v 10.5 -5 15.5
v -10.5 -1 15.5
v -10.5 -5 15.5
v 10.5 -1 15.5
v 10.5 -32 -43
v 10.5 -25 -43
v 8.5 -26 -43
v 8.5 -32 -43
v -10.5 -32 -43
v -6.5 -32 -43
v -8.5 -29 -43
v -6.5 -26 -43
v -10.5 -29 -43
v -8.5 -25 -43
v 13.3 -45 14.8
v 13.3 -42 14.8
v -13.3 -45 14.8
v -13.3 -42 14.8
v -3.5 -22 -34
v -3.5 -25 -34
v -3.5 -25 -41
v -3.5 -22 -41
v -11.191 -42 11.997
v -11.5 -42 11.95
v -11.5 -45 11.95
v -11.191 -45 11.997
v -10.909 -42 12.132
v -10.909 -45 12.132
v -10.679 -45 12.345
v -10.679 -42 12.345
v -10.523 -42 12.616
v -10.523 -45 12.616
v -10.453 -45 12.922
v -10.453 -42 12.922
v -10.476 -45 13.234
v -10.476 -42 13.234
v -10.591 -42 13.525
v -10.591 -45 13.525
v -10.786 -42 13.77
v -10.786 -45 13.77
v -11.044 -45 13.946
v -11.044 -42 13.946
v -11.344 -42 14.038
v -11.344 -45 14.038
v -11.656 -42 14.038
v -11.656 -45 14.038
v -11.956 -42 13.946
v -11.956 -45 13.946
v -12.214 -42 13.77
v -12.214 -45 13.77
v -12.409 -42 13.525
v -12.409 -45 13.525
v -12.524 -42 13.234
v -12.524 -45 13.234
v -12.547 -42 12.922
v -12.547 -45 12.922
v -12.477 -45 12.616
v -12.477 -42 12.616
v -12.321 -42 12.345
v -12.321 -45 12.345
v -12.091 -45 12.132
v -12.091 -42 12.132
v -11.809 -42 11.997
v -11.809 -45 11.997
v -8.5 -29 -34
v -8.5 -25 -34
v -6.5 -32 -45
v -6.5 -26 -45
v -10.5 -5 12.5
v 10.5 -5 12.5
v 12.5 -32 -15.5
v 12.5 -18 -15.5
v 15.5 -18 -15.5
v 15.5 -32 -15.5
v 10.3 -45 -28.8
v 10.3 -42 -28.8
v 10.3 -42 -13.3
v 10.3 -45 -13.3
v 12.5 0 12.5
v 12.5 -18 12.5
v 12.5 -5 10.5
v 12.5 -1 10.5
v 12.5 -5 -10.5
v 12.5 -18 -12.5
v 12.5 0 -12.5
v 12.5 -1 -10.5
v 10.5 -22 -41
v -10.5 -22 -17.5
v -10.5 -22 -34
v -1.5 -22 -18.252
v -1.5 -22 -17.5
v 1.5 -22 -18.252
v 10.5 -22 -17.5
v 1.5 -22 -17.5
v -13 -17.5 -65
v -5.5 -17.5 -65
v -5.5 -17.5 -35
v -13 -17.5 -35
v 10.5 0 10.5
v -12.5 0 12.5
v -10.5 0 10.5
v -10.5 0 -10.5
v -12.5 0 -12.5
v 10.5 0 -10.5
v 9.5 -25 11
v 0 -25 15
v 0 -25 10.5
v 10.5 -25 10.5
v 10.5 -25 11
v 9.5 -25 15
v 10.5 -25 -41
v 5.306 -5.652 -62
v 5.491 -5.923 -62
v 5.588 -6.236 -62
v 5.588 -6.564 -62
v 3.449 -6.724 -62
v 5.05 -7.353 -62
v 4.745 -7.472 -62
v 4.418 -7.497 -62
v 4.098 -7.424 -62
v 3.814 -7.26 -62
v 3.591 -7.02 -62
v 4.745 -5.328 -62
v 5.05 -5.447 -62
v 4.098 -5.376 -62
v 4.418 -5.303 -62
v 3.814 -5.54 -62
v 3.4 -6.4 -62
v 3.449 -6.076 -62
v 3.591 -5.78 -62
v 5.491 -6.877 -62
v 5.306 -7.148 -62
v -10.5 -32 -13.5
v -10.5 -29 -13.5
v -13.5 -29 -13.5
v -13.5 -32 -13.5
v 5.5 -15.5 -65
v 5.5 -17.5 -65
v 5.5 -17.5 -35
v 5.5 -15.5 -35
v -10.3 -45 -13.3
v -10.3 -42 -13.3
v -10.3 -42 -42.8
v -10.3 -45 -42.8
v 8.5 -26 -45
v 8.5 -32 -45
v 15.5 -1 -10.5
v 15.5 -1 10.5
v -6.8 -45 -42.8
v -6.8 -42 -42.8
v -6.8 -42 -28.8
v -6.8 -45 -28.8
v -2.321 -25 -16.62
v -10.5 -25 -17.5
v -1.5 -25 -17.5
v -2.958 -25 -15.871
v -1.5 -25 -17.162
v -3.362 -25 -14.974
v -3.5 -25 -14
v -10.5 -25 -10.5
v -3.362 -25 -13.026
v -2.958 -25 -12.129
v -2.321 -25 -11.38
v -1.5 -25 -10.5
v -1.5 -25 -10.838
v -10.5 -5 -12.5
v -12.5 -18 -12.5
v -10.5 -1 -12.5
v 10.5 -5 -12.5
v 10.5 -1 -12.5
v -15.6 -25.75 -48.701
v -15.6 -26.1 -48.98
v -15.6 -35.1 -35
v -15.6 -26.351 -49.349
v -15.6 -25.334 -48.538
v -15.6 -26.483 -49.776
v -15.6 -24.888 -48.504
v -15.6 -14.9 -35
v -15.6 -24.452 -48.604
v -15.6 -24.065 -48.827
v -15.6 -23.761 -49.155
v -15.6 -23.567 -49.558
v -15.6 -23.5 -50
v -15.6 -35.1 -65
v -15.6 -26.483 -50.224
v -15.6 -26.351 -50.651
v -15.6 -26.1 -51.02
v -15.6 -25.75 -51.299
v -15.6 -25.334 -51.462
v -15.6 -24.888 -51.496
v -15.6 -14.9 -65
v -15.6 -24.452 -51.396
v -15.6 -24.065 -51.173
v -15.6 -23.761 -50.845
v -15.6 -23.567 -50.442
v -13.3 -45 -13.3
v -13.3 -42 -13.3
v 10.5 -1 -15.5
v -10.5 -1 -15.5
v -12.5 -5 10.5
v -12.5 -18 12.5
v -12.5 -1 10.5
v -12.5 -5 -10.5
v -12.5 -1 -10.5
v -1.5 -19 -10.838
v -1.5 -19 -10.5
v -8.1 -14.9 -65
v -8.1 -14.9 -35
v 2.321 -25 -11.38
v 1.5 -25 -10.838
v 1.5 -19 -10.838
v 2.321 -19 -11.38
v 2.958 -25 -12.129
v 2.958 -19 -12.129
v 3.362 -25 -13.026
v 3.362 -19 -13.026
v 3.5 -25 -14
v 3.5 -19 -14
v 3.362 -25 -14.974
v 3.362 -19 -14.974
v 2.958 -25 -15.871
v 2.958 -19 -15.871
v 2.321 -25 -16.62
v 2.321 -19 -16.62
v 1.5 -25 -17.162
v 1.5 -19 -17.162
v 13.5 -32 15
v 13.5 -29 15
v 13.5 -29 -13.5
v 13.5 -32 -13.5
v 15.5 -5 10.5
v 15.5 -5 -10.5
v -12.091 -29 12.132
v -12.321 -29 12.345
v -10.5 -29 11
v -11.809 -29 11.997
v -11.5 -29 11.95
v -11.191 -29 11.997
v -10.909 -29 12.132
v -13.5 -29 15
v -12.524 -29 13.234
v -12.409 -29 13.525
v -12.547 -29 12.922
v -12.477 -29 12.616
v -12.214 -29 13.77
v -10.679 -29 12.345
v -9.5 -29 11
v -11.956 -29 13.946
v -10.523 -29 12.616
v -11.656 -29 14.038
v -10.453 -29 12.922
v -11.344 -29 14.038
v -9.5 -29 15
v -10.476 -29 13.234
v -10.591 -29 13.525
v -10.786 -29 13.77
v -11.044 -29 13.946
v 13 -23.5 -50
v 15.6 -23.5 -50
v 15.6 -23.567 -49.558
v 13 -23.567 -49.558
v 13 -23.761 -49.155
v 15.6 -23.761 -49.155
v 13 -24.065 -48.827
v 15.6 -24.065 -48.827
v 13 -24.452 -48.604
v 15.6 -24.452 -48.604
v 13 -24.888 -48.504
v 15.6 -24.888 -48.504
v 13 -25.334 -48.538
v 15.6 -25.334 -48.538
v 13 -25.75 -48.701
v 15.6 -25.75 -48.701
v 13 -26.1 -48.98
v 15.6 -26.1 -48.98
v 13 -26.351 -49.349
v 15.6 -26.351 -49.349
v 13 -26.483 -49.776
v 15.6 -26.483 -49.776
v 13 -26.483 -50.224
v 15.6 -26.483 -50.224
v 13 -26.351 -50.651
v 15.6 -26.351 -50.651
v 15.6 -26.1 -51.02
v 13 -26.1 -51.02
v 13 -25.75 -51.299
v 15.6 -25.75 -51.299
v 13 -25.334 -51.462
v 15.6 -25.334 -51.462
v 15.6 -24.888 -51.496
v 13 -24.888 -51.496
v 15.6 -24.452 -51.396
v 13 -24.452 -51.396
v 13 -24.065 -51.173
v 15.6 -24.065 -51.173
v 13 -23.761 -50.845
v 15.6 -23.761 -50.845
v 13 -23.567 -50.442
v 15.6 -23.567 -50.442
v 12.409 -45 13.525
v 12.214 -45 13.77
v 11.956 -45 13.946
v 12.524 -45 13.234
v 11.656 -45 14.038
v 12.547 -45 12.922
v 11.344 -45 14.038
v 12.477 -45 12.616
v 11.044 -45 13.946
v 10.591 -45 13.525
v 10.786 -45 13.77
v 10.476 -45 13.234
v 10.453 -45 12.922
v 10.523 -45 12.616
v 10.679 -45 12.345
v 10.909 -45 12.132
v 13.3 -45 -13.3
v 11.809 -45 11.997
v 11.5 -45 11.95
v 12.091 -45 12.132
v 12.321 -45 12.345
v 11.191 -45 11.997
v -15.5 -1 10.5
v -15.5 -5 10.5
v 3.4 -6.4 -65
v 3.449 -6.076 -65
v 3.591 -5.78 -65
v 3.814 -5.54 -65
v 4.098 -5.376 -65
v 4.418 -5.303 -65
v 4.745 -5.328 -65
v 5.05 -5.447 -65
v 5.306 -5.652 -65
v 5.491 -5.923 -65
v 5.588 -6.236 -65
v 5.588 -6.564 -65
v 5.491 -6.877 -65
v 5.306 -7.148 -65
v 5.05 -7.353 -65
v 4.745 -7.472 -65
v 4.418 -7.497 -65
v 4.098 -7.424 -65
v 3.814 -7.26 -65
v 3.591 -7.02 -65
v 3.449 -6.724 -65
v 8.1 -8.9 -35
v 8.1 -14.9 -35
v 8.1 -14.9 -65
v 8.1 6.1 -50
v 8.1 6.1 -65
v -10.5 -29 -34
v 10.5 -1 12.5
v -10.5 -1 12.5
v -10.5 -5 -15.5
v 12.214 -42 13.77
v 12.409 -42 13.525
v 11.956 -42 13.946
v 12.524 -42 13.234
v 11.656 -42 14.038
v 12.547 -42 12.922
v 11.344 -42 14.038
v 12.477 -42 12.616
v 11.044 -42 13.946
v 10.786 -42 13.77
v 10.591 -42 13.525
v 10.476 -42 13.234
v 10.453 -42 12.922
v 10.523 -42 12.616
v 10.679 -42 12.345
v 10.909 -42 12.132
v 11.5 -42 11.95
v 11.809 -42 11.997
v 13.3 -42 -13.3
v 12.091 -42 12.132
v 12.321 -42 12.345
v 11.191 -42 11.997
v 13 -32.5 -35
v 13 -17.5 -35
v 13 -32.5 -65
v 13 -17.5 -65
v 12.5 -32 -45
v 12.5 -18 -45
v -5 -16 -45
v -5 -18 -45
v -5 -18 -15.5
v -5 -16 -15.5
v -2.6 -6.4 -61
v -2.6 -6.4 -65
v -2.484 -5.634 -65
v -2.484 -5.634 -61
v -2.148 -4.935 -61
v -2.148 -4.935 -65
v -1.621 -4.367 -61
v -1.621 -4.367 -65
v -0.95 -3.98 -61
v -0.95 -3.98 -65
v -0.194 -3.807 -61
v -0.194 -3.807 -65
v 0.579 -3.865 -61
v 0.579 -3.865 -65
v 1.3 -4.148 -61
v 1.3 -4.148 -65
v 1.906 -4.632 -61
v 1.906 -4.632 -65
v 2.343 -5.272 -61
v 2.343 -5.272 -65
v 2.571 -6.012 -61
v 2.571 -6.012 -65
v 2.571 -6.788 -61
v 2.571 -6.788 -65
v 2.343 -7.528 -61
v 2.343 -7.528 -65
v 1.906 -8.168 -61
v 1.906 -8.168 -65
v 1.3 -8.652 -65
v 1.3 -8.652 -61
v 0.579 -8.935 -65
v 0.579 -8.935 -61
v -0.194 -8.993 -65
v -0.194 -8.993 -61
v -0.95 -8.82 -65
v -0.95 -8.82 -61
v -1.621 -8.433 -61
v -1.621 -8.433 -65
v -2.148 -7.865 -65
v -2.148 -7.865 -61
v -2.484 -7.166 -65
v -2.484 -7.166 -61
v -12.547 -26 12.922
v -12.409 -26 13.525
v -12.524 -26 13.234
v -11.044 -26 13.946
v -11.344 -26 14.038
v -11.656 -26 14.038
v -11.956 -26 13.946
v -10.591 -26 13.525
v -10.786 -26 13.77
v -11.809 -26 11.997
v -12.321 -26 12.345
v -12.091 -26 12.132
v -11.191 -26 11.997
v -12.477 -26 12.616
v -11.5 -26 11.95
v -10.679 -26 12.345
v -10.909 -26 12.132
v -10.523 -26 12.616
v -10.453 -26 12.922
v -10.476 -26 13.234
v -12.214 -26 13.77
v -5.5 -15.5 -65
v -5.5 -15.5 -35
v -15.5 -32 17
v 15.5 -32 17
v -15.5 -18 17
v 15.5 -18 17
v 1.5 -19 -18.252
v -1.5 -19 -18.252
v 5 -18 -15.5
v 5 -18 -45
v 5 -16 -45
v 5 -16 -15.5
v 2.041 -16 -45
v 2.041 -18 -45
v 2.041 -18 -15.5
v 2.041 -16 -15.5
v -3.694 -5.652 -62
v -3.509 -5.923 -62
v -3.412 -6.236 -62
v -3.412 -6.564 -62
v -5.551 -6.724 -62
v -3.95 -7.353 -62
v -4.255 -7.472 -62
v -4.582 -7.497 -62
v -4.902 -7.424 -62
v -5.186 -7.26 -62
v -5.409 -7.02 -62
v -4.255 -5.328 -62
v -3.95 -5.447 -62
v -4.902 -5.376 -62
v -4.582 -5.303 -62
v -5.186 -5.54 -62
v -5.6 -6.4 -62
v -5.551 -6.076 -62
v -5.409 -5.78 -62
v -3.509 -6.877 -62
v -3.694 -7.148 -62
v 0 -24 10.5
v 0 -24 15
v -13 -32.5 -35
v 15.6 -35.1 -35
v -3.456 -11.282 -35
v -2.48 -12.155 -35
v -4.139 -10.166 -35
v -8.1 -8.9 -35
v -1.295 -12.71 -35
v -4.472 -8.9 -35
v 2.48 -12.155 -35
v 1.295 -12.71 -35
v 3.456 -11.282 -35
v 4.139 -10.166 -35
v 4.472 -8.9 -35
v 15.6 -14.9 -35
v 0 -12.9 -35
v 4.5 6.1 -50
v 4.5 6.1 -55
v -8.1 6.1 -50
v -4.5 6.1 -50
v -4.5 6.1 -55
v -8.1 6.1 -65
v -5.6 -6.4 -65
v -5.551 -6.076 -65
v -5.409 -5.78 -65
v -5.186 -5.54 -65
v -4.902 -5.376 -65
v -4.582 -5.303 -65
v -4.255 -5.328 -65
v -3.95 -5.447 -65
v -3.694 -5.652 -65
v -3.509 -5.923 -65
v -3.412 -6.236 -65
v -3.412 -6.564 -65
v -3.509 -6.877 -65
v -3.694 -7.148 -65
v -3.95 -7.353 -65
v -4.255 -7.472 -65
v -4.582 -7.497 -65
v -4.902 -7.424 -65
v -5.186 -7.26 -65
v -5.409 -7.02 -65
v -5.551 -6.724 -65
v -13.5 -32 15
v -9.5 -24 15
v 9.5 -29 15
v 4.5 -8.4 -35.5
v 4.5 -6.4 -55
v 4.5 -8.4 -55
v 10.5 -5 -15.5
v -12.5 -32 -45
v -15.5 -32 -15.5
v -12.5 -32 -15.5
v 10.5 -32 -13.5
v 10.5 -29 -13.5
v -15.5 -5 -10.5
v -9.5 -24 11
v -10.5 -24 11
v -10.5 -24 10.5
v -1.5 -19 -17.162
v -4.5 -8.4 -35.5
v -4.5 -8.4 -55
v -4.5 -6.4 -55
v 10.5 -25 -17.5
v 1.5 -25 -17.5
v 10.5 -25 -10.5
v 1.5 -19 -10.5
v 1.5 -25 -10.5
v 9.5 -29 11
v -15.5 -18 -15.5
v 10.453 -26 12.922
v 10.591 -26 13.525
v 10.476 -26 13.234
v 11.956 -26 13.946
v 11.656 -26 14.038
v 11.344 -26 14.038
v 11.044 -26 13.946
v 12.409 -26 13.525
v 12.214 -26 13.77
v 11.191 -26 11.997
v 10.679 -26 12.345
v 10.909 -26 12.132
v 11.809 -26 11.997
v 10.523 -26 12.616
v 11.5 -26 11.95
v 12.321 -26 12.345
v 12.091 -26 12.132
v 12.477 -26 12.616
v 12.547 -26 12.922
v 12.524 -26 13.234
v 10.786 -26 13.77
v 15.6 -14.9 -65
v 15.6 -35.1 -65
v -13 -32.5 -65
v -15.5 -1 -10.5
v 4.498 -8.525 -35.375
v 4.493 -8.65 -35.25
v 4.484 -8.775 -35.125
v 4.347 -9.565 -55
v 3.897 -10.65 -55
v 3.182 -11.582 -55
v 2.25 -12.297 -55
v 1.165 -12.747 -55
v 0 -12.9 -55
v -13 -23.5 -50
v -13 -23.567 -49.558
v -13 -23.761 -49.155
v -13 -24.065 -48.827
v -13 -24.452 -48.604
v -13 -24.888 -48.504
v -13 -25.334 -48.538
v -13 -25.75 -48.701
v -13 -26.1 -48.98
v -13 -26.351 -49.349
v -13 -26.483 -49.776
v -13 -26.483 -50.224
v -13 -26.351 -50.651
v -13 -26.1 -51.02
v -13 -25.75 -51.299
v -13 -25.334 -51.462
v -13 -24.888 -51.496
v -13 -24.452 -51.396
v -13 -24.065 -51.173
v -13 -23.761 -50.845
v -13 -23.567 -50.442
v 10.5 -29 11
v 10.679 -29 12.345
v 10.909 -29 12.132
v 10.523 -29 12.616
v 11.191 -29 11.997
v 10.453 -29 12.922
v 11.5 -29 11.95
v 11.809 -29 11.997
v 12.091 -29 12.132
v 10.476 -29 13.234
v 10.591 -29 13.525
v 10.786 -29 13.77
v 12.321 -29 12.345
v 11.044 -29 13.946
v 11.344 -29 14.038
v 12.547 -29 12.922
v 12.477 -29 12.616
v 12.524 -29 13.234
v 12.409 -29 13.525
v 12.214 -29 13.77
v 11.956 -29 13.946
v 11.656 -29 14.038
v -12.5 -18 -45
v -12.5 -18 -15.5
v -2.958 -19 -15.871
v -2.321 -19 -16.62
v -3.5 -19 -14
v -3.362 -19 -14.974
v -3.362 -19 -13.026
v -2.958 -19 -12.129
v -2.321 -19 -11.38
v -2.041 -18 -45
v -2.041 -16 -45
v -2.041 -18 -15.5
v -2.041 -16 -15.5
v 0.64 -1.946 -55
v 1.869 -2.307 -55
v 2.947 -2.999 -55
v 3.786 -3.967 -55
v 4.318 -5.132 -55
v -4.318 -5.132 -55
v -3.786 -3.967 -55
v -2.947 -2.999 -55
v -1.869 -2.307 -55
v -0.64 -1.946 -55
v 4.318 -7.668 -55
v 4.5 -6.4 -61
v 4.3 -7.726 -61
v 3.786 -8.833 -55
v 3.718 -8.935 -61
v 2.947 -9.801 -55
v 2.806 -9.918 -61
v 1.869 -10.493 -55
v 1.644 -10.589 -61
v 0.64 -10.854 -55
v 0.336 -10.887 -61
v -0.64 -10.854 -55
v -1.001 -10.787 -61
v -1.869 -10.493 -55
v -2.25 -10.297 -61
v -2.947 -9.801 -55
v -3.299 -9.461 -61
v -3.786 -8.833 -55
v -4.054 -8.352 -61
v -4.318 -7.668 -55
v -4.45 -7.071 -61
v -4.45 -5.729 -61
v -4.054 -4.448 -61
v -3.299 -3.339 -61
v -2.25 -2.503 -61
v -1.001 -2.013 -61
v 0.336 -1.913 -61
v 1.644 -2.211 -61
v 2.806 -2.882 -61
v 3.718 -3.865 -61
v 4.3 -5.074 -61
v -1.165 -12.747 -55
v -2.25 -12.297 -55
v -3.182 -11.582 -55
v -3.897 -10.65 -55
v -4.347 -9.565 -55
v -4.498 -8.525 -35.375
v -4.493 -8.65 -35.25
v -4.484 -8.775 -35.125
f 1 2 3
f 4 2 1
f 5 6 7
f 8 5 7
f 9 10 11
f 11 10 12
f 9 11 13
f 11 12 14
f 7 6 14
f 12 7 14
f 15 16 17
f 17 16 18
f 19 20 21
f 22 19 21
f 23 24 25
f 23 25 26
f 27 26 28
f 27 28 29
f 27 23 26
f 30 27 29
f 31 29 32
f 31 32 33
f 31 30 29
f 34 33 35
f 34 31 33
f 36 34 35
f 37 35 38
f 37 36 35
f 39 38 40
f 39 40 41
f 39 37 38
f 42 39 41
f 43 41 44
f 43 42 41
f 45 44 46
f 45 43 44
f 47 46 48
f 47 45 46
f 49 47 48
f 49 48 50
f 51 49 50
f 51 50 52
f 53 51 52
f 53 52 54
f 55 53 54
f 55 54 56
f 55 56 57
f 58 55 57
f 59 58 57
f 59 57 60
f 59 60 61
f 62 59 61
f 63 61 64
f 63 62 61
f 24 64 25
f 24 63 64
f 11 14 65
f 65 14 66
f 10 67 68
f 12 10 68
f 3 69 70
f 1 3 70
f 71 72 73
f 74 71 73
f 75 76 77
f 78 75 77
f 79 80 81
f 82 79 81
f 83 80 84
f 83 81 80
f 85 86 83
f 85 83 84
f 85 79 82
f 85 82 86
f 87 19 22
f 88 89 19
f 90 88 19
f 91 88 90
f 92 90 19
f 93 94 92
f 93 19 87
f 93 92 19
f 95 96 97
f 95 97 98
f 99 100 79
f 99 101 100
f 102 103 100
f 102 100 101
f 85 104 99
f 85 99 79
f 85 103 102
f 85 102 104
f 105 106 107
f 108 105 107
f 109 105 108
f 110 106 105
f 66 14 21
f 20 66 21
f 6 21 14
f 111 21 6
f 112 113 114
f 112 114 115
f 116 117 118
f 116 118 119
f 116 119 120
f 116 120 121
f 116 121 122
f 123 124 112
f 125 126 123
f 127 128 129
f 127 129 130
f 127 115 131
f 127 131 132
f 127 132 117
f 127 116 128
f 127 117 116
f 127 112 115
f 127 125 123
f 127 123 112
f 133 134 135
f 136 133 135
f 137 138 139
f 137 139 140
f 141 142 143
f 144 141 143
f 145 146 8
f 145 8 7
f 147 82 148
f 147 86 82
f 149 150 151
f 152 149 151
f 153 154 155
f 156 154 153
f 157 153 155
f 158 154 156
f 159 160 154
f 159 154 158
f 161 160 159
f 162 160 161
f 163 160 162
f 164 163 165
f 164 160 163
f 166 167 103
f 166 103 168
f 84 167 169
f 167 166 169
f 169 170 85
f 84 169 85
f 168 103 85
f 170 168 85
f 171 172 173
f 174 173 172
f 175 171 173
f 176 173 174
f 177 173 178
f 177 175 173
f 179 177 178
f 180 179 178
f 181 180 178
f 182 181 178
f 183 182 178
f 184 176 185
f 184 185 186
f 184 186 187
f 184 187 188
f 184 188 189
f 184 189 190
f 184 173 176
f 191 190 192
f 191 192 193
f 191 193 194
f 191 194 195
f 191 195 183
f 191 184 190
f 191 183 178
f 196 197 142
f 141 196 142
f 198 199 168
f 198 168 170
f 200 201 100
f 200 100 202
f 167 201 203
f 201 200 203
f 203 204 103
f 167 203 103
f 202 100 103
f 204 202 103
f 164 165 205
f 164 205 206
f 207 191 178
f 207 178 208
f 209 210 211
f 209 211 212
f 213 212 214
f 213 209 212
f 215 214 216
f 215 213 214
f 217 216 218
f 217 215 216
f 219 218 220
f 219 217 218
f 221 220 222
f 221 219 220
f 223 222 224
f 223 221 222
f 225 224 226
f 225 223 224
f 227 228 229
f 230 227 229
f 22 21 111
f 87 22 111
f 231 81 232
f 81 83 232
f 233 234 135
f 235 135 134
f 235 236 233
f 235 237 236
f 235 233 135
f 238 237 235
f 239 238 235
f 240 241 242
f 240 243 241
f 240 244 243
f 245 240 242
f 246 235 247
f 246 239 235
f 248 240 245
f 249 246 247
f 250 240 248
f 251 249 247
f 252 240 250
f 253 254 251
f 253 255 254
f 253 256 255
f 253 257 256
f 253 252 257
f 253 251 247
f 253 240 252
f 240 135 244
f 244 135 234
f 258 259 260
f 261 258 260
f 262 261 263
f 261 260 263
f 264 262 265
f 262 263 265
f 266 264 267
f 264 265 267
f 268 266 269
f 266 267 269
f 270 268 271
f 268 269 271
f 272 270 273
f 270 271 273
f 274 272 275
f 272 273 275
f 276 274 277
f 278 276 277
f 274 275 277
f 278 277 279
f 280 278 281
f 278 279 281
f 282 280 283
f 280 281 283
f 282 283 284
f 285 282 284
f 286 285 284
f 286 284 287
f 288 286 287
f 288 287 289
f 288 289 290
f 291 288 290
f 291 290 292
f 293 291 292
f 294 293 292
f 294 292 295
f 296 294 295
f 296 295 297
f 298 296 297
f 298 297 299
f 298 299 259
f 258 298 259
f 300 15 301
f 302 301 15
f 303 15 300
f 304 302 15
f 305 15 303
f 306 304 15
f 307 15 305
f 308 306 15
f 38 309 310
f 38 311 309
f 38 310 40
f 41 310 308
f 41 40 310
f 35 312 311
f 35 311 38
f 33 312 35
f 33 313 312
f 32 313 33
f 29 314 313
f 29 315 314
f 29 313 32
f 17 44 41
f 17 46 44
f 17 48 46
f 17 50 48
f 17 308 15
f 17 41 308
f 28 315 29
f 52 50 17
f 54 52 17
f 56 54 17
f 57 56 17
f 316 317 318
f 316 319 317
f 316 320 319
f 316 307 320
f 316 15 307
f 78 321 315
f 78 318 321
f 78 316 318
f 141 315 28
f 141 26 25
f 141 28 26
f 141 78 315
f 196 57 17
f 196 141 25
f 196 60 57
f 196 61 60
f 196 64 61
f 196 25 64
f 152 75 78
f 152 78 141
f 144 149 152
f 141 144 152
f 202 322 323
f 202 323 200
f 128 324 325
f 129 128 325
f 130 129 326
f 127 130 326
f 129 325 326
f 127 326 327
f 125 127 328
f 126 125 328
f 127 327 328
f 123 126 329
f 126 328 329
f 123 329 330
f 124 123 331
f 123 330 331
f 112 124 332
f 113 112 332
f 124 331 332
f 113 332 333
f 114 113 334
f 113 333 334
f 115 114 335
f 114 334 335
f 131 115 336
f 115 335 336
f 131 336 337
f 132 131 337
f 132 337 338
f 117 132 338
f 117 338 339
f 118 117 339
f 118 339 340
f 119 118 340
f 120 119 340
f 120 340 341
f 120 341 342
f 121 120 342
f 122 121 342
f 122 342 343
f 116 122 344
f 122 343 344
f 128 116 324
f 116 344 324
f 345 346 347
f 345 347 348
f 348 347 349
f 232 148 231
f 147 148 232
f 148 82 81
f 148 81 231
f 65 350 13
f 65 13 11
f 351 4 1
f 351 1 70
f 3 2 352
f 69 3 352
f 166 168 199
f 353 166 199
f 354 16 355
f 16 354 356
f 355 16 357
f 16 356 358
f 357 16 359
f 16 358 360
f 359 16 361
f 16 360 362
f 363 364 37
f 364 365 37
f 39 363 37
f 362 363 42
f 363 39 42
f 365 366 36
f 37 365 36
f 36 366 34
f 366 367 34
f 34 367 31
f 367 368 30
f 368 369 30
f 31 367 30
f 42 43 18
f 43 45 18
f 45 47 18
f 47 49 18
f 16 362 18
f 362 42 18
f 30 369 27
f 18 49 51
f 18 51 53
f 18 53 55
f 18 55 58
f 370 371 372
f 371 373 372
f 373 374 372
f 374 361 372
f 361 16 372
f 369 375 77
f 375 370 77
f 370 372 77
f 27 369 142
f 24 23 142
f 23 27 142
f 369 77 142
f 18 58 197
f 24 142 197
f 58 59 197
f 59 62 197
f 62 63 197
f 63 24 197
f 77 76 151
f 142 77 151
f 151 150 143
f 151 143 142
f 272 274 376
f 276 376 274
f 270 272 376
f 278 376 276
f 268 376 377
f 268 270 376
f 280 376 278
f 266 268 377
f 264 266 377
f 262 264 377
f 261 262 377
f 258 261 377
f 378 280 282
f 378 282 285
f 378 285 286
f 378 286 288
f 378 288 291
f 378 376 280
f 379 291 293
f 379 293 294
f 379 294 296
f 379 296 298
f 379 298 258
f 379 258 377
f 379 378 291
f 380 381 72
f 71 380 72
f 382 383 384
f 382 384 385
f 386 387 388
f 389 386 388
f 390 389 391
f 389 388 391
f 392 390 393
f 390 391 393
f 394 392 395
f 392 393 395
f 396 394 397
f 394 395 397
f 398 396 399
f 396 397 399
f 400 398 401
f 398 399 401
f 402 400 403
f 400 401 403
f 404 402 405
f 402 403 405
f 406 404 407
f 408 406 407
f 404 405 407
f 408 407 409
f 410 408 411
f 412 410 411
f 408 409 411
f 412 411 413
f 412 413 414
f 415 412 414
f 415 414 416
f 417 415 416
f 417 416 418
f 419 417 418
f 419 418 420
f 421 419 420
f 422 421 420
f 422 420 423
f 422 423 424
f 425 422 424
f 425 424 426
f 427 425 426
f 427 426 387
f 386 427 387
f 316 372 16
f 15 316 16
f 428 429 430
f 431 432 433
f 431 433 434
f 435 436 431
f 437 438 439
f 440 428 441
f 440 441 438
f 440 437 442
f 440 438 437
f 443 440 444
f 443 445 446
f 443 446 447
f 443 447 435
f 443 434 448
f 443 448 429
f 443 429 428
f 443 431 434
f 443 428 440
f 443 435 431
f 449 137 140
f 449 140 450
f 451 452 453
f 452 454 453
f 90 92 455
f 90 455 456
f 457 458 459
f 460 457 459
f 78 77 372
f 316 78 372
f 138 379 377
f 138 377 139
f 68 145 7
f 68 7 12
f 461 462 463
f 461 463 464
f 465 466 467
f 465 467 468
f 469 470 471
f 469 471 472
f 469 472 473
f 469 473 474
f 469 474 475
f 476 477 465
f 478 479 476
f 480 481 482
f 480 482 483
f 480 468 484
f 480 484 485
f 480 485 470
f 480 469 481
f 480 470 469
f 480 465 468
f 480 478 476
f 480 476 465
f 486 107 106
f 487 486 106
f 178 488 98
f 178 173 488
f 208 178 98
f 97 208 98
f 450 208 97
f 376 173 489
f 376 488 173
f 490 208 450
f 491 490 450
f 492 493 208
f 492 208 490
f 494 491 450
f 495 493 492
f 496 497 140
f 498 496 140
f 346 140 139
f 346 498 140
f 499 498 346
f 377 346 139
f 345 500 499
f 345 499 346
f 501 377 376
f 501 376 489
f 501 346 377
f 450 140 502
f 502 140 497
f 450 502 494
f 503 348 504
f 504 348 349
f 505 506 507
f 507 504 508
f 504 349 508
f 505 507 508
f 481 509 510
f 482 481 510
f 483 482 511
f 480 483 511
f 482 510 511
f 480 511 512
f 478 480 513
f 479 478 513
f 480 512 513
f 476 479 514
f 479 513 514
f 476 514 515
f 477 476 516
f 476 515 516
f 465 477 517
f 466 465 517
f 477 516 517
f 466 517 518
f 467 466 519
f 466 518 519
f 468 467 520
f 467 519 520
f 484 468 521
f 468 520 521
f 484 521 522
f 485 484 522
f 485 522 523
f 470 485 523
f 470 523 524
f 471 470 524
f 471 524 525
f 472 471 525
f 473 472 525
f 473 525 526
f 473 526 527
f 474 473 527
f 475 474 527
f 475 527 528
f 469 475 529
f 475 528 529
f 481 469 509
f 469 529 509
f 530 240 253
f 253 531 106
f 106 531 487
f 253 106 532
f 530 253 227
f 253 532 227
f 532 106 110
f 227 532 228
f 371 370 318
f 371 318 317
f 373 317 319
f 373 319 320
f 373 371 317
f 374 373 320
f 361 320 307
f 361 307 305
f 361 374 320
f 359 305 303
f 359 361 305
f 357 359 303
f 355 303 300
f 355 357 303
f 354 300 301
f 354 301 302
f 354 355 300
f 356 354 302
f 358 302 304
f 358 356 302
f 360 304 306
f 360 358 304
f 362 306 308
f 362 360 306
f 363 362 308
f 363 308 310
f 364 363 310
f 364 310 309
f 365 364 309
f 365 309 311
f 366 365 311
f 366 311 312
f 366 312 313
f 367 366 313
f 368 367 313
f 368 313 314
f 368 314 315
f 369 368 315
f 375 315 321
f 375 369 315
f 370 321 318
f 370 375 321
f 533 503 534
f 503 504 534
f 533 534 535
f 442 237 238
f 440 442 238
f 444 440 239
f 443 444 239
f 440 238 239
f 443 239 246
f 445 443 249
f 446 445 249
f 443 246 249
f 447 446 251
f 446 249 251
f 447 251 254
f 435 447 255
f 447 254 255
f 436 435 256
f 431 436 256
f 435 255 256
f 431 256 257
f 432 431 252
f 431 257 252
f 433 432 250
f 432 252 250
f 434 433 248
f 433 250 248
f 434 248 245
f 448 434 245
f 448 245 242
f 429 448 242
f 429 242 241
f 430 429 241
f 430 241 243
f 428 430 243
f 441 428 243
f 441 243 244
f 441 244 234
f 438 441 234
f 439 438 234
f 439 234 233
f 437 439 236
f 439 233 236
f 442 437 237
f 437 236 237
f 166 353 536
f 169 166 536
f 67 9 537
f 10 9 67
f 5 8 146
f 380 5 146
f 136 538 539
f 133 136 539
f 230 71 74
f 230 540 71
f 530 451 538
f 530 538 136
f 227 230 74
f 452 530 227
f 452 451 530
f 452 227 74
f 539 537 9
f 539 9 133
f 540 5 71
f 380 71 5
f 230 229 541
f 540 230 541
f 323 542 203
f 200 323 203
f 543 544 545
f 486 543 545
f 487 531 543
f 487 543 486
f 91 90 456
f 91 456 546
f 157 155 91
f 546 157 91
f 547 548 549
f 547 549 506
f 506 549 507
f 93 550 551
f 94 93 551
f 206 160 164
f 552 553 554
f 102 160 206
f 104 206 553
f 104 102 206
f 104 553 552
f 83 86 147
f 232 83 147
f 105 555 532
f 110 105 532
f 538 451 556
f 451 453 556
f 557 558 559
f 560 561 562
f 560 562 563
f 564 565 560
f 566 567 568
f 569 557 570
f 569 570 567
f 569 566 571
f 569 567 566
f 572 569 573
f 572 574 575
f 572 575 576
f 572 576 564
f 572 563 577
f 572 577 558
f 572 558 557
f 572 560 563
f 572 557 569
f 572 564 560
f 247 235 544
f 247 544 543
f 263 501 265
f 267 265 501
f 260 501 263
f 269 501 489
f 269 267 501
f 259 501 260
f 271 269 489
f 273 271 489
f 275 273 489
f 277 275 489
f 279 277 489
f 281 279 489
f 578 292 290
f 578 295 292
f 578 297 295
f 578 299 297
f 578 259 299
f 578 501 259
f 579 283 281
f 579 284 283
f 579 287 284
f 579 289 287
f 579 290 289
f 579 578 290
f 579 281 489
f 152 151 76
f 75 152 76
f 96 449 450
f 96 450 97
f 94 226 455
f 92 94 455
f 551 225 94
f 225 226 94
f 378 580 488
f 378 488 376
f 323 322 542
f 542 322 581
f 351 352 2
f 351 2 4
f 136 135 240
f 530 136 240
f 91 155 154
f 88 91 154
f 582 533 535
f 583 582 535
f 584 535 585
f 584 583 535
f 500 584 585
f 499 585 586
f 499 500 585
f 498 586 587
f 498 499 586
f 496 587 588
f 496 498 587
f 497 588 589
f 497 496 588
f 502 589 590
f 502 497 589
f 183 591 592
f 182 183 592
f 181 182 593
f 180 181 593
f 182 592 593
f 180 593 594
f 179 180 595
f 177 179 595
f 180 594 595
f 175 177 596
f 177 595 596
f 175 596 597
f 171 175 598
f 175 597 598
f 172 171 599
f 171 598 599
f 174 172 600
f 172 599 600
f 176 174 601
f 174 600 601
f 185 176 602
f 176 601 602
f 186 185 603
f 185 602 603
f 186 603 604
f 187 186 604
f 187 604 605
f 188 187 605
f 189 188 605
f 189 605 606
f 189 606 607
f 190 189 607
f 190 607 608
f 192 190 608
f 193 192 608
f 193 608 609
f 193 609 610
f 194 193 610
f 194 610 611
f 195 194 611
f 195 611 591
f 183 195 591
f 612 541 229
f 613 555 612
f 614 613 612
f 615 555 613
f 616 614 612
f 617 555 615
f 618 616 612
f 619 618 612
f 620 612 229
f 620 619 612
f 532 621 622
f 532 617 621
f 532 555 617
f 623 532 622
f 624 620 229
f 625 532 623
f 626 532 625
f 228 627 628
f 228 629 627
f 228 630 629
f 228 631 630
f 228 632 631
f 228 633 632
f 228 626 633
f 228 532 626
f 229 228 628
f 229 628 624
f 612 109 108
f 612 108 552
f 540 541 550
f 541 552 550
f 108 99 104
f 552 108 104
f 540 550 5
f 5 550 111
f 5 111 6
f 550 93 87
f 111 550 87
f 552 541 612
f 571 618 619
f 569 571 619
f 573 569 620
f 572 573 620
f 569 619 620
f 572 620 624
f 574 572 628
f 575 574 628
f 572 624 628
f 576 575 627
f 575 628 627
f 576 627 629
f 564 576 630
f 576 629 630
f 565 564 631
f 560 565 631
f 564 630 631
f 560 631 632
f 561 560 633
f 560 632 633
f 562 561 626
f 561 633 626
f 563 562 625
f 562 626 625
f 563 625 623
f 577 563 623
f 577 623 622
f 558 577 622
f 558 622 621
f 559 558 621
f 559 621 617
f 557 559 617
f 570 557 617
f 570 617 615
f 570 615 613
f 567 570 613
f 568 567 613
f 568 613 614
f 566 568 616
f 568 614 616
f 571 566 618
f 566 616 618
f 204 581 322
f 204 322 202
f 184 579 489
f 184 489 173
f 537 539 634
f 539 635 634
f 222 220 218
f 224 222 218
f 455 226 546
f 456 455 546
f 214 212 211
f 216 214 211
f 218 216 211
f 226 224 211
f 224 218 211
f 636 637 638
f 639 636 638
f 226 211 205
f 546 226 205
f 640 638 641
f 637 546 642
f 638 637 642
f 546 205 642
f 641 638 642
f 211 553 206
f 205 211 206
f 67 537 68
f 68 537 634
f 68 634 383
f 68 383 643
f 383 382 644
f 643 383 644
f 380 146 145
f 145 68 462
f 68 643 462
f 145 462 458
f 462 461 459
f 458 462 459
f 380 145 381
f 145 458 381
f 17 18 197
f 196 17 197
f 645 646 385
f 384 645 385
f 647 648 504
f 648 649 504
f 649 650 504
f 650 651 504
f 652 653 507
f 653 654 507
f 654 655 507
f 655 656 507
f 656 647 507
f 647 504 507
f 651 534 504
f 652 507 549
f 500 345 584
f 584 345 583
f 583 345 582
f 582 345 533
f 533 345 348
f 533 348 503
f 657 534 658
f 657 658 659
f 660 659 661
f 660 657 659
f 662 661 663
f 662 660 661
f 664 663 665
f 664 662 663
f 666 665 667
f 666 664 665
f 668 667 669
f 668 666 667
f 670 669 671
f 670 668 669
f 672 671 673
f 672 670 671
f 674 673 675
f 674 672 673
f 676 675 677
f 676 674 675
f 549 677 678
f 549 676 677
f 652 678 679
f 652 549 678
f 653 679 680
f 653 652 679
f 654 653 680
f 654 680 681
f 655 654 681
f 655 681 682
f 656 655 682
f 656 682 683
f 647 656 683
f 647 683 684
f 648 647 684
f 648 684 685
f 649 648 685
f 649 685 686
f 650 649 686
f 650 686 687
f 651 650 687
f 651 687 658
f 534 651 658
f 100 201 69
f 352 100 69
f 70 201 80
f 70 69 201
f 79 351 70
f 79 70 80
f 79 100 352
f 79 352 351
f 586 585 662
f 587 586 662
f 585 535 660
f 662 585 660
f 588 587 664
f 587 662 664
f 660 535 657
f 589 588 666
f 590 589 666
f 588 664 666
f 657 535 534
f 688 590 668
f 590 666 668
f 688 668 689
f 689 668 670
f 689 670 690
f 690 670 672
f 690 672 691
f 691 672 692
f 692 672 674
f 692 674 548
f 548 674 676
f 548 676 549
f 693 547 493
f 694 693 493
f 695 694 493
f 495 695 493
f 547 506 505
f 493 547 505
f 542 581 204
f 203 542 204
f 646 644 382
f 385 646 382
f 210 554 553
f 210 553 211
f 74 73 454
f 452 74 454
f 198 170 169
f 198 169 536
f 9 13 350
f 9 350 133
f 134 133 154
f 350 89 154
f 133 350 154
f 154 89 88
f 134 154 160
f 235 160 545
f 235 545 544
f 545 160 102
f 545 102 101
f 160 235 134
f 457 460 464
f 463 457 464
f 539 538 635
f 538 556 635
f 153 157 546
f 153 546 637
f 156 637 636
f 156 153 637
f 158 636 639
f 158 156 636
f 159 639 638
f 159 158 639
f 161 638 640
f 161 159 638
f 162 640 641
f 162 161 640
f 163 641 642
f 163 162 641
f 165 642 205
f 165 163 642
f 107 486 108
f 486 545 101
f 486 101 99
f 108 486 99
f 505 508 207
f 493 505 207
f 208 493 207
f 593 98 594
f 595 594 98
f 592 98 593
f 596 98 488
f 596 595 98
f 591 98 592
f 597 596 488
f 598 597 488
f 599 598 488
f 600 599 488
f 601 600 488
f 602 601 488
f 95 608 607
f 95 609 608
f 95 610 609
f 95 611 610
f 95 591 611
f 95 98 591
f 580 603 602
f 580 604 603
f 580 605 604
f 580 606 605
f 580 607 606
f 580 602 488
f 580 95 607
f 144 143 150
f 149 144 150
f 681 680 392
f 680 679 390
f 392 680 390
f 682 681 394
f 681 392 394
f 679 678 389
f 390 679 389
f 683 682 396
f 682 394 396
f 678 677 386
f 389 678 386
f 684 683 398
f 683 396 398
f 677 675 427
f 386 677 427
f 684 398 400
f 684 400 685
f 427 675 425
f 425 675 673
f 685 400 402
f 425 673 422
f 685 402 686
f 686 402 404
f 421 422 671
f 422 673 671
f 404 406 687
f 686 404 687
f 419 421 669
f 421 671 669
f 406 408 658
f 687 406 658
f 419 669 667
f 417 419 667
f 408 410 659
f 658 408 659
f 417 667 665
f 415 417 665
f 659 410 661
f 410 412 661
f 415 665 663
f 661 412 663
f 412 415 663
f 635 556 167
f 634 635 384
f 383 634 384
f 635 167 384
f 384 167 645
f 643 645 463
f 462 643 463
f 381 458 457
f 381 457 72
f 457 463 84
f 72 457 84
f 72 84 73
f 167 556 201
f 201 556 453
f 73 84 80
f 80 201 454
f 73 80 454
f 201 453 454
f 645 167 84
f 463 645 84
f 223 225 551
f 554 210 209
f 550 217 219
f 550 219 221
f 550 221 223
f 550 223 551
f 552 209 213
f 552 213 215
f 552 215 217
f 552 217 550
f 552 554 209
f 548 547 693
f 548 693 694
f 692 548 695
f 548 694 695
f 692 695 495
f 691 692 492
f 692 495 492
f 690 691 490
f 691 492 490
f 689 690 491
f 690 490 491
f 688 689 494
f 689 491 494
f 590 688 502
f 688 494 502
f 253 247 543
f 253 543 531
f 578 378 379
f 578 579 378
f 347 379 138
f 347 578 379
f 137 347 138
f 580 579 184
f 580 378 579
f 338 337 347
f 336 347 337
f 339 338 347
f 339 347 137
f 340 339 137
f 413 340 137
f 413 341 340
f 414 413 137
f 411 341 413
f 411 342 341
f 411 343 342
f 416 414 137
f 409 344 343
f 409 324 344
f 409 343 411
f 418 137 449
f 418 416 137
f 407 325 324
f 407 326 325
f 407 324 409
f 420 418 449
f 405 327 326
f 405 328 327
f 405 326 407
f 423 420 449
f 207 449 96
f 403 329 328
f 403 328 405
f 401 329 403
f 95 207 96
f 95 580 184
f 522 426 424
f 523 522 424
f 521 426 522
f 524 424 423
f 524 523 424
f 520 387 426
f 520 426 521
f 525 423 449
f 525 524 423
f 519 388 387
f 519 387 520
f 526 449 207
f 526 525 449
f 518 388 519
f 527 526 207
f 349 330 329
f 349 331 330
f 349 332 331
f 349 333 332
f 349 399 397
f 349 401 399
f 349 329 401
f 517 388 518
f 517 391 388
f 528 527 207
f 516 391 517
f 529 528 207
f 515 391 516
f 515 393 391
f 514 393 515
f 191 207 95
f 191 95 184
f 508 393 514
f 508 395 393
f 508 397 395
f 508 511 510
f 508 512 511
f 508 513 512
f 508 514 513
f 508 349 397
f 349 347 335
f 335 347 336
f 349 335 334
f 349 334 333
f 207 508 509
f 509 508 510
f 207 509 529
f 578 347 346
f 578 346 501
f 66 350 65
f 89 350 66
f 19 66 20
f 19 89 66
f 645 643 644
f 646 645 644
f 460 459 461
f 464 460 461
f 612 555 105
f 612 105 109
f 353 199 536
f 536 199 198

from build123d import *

# Parameters (mm, degrees)
SKETCH2_W            = 25
SKETCH2_H            = 25
SKETCH2_W_2          = 21
SKETCH2_H_2          = 21
BOSS_EXTRUDE1_DEPTH  = 25
BOSS_EXTRUDE2_START  = -1
SKETCH2_3_W          = 31
SKETCH2_3_H          = 31
SKETCH2_3_W_2        = 25
SKETCH2_3_H_2        = 25
BOSS_EXTRUDE2_DEPTH  = 4
SKETCH3_W            = 21
SKETCH3_H            = 21
BOSS_EXTRUDE4_DEPTH  = 7
CUT_EXTRUDE2_DEPTH   = 6
SKETCH3_12_W         = 21
SKETCH3_12_H         = 58
BOSS_EXTRUDE5_DEPTH  = 4
SKETCH3_16_W         = 10.5
SKETCH3_16_H         = 2
SKETCH3_16_H_2       = 2.5
CUT_EXTRUDE12_DEPTH  = 1
SKETCH6_W            = 1
SKETCH6_H            = 4
BOSS_EXTRUDE7_DEPTH  = 6
BOSS_EXTRUDE8_DEPTH  = 3
SKETCH7_R            = 1.05
CUT_EXTRUDE9_DEPTH   = 3
CUT_EXTRUDE11_DEPTH  = 3
SKETCH10_W           = 2
SKETCH10_H           = 9
BOSS_EXTRUDE12_DEPTH = 4
SKETCH8_R            = 1.05
BOSS_EXTRUDE9_DEPTH  = 3
SKETCH9_W            = 15
SKETCH9_H            = 6
CUT_EXTRUDE10_DEPTH  = 2
SKETCH11_W           = 3
SKETCH11_H           = 3
SKETCH11_W_2         = 2
SKETCH11_H_2         = 2
CUT_EXTRUDE13_DEPTH  = 4
SKETCH12_W           = 2.959272996
SKETCH12_H           = 2
BOSS_EXTRUDE13_DEPTH = 29.5
BOSS_EXTRUDE14_DEPTH = 30
SKETCH14_W           = 16.2
SKETCH14_H           = 19
BOSS_EXTRUDE16_DEPTH = 10
SKETCH14_5_R         = 1.1
CUT_EXTRUDE14_DEPTH  = 3
SKETCH14_7_R         = 2.6
CUT_EXTRUDE15_DEPTH  = 10
CUT_EXTRUDE16_START  = -10
SKETCH14_8_R         = 4.5
CUT_EXTRUDE16_DEPTH  = 6
BOSS_EXTRUDE18_DEPTH = 20
CHAMFER1_SIZE        = 15
FILLET1_R            = 4.5
SKETCH19_R           = 1.5
CUT_EXTRUDE17_DEPTH  = 35


with BuildPart() as part:
    # Sketch2 → Boss-Extrude1 (new body)
    with BuildSketch(Plane(origin=(0, 0, 0), x_dir=(1, 0, 0), z_dir=(0, 1, 0))):
        Rectangle(SKETCH2_W, SKETCH2_H)
        Rectangle(SKETCH2_W_2, SKETCH2_H_2, mode=Mode.SUBTRACT)
    extrude(amount=-BOSS_EXTRUDE1_DEPTH)

    # Sketch2<3> → Boss-Extrude2 (add)
    with BuildSketch(Plane(origin=(0, 0, 0), x_dir=(1, 0, 0), z_dir=(0, 1, 0)).offset(BOSS_EXTRUDE2_START)):
        Rectangle(SKETCH2_3_W, SKETCH2_3_H)
        Rectangle(SKETCH2_3_W_2, SKETCH2_3_H_2, mode=Mode.SUBTRACT)
    extrude(amount=-BOSS_EXTRUDE2_DEPTH)

    # Sketch3 → Boss-Extrude4 (add)
    with BuildSketch(Plane.XZ.offset(25)):
        Polygon((-15.5, -15.5), (-12.5, -15.5), (-12.5, -45), (12.5, -45), (12.5, -15.5), (15.5, -15.5), (15.5, 17), (-15.5, 17), align=None)
        Rectangle(SKETCH3_W, SKETCH3_H, mode=Mode.SUBTRACT)
    extrude(amount=-BOSS_EXTRUDE4_DEPTH)

    # Sketch3<7> → Cut-Extrude2 (cut)
    with BuildSketch(Plane.XZ.offset(25)):
        with BuildLine():
            Line((-1.5, -10.83772234), (-1.5, -9.748010995))
            Line((-1.5, -9.748010995), (1.5, -9.748010995))
            Line((1.5, -9.748010995), (1.5, -10.83772234))
            ThreePointArc((1.5, -10.83772234), (3.5, -14), (1.5, -17.16227766))
            Line((1.5, -17.16227766), (1.5, -18.251989005))
            Line((1.5, -18.251989005), (-1.5, -18.251989005))
            Line((-1.5, -18.251989005), (-1.5, -17.16227766))
            ThreePointArc((-1.5, -17.16227766), (-3.5, -14), (-1.5, -10.83772234))
        make_face()
    extrude(amount=-CUT_EXTRUDE2_DEPTH, mode=Mode.SUBTRACT)

    # Sketch3<12> → Boss-Extrude5 (add)
    with BuildSketch(Plane.XZ.offset(25)):
        Polygon((-12.5, -15.5), (-12.5, -45), (12.5, -45), (12.5, -15.5), (15.5, -15.5), (15.5, 17), (-15.5, 17), (-15.5, -15.5), align=None)
        with Locations((0, -14)):
            Rectangle(SKETCH3_12_W, SKETCH3_12_H, mode=Mode.SUBTRACT)
    extrude(amount=BOSS_EXTRUDE5_DEPTH)

    # Sketch3<16> → Cut-Extrude12 (cut)
    with BuildSketch(Plane.XZ.offset(25)):
        with Locations((-5.25, 11.5)):
            Rectangle(SKETCH3_16_W, SKETCH3_16_H)
        with Locations((-5.25, 13.75)):
            Rectangle(SKETCH3_16_W, SKETCH3_16_H_2)
    extrude(amount=-CUT_EXTRUDE12_DEPTH, mode=Mode.SUBTRACT)

    # Sketch6 → Boss-Extrude7 (add)
    with BuildSketch(Plane.XZ.offset(29)):
        with Locations((10, 13)):
            Rectangle(SKETCH6_W, SKETCH6_H)
        with Locations((-10, 13)):
            Rectangle(SKETCH6_W, SKETCH6_H)
    extrude(amount=-BOSS_EXTRUDE7_DEPTH)

    # Sketch6<3> → Boss-Extrude8 (add)
    with BuildSketch(Plane.XZ.offset(29)):
        Polygon((15.5, -15.5), (15.5, 17), (-15.5, 17), (-15.5, -15.5), (-12.5, -15.5), (-12.5, -45), (12.5, -45), (12.5, -15.5), align=None)
        Polygon((10.5, 15), (13.5, 15), (13.5, 11), (13.5, -13.5), (10.5, -13.5), (10.5, -43), (-10.5, -43), (-10.5, -13.5), (-13.5, -13.5), (-13.5, 11), (-13.5, 15), (-10.5, 15), (-9.5, 15), (9.5, 15), align=None, mode=Mode.SUBTRACT)
    extrude(amount=BOSS_EXTRUDE8_DEPTH)

    # Sketch7 → Cut-Extrude9 (cut)
    with BuildSketch(Plane.XZ.offset(29)):
        with Locations(Location((-11.5, 13, 0), (0, 0, 270))):
            Circle(SKETCH7_R)
        with Locations(Location((11.5, 13, 0), (0, 0, 270))):
            Circle(SKETCH7_R)
    extrude(amount=-CUT_EXTRUDE9_DEPTH, mode=Mode.SUBTRACT)

    # Sketch3<14> → Cut-Extrude11 (cut)
    with BuildSketch(Plane.XZ.offset(25)):
        Polygon((-1.5, -17.5), (-10.5, -17.5), (-10.5, -34), (-3.5, -34), (-3.5, -41), (10.5, -41), (10.5, -17.5), (1.5, -17.5), (1.5, -18.251989005), (-1.5, -18.251989005), align=None)
    extrude(amount=-CUT_EXTRUDE11_DEPTH, mode=Mode.SUBTRACT)

    # Sketch10 → Boss-Extrude12 (add)
    with BuildSketch(Plane.XZ.offset(25)):
        with Locations((-9.5, -38.5)):
            Rectangle(SKETCH10_W, SKETCH10_H)
    extrude(amount=BOSS_EXTRUDE12_DEPTH)

    # Sketch9 → Cut-Extrude10 (cut)
    with BuildSketch(Plane(origin=(0, 0, -45), x_dir=(-1, 0, 0), z_dir=(0, 0, -1))):
        with Locations((-1, -29)):
            Rectangle(SKETCH9_W, SKETCH9_H)
    extrude(amount=-CUT_EXTRUDE10_DEPTH, mode=Mode.SUBTRACT)

    # Sketch11 → Cut-Extrude13 (cut)
    with BuildSketch(Plane(origin=(0, -1, 0), x_dir=(1, 0, 0), z_dir=(0, 1, 0))):
        with Locations((-14, -14)):
            Rectangle(SKETCH11_W, SKETCH11_H)
        with Locations((-11.5, -14)):
            Rectangle(SKETCH11_W_2, SKETCH11_H)
        with Locations((-14, -11.5)):
            Rectangle(SKETCH11_W, SKETCH11_H_2)
        with Locations((11.5, -14)):
            Rectangle(SKETCH11_W_2, SKETCH11_H)
        with Locations((14, -14)):
            Rectangle(SKETCH11_W, SKETCH11_H)
        with Locations((14, -11.5)):
            Rectangle(SKETCH11_W, SKETCH11_H_2)
        with Locations((-14, 11.5)):
            Rectangle(SKETCH11_W, SKETCH11_H_2)
        with Locations((-14, 14)):
            Rectangle(SKETCH11_W, SKETCH11_H)
        with Locations((-11.5, 14)):
            Rectangle(SKETCH11_W_2, SKETCH11_H)
        with Locations((11.5, 14)):
            Rectangle(SKETCH11_W_2, SKETCH11_H)
        with Locations((14, 14)):
            Rectangle(SKETCH11_W, SKETCH11_H)
        with Locations((14, 11.5)):
            Rectangle(SKETCH11_W, SKETCH11_H_2)
    extrude(amount=-CUT_EXTRUDE13_DEPTH, mode=Mode.SUBTRACT)

    # Sketch12 → Boss-Extrude13 (add)
    with BuildSketch(Plane(origin=(0, 0, -45), x_dir=(-1, 0, 0), z_dir=(0, 0, -1))):
        with Locations((-3.520363502, -17)):
            Rectangle(SKETCH12_W, SKETCH12_H)
        with Locations((3.520363502, -17)):
            Rectangle(SKETCH12_W, SKETCH12_H)
    extrude(amount=-BOSS_EXTRUDE13_DEPTH)


with BuildPart() as body_2:
    # Sketch8 → Boss-Extrude9 (new body)
    with BuildSketch(Plane(origin=(0, -42, 0), x_dir=(-1, 0, 0), z_dir=(0, -1, 0))):
        Polygon((-13.3, 13.3), (-13.3, -14.8), (13.3, -14.8), (13.3, 13.3), (10.3, 13.3), (10.3, 42.8), (6.8, 42.8), (6.8, 28.8), (-10.3, 28.8), (-10.3, 13.3), align=None)
        with Locations(Location((-11.5, -13, 0), (0, 0, 90))):
            Circle(SKETCH8_R, mode=Mode.SUBTRACT)
        with Locations(Location((11.5, -13, 0), (0, 0, 90))):
            Circle(SKETCH8_R, mode=Mode.SUBTRACT)
    extrude(amount=BOSS_EXTRUDE9_DEPTH)


with BuildPart() as body_3:
    # Sketch13 → Boss-Extrude14 (new body)
    with BuildSketch(Plane(origin=(0, 0, -65), x_dir=(-1, 0, 0), z_dir=(0, 0, -1))):
        Polygon((-8.5, -35.1), (6.5, -35.1), (15.6, -35.1), (15.6, -14.9), (8.1, -14.9), (8.1, -12.9), (0, -12.9), (-8.1, -12.9), (-8.1, -14.9), (-15.6, -14.9), (-15.6, -35.1), align=None)
        Polygon((13, -32.5), (6.5, -32.5), (-8.5, -32.5), (-13, -32.5), (-13, -17.5), (-5.5, -17.5), (-5.5, -15.5), (1.540727004, -15.5), (5.5, -15.5), (5.5, -17.5), (13, -17.5), align=None, mode=Mode.SUBTRACT)
    extrude(amount=-BOSS_EXTRUDE14_DEPTH)

    # Sketch14 → Boss-Extrude16 (add)
    with BuildSketch(Plane(origin=(0, 0, -65), x_dir=(-1, 0, 0), z_dir=(0, 0, -1))):
        with Locations((0, -3.4)):
            Rectangle(SKETCH14_W, SKETCH14_H)
    extrude(amount=-BOSS_EXTRUDE16_DEPTH)

    # Sketch14<5> → Cut-Extrude14 (cut)
    with BuildSketch(Plane(origin=(0, 0, -65), x_dir=(-1, 0, 0), z_dir=(0, 0, -1))):
        with Locations((4.5, -6.4)):
            Circle(SKETCH14_5_R)
        with Locations((-4.5, -6.4)):
            Circle(SKETCH14_5_R)
    extrude(amount=-CUT_EXTRUDE14_DEPTH, mode=Mode.SUBTRACT)

    # Sketch14<7> → Cut-Extrude15 (cut)
    with BuildSketch(Plane(origin=(0, 0, -65), x_dir=(-1, 0, 0), z_dir=(0, 0, -1))):
        with Locations((0, -6.4)):
            Circle(SKETCH14_7_R)
    extrude(amount=-CUT_EXTRUDE15_DEPTH, mode=Mode.SUBTRACT)

    # Sketch14<8> → Cut-Extrude16 (cut)
    with BuildSketch(Plane(origin=(0, 0, -65), x_dir=(-1, 0, 0), z_dir=(0, 0, -1)).offset(CUT_EXTRUDE16_START)):
        with Locations(Location((0, -6.4, 0), (0, 0, 180))):
            Circle(SKETCH14_8_R)
    extrude(amount=CUT_EXTRUDE16_DEPTH, mode=Mode.SUBTRACT)

    # Sketch18 → Boss-Extrude18 (add)
    with BuildSketch(Plane.XY.offset(-55)):
        Polygon((-8.1, 6.1), (-8.1, -12.9), (-4.5, -12.9), (-4.5, -6.4), (-4.5, 6.1), align=None)
        Polygon((4.5, -6.4), (4.5, -12.9), (8.1, -12.9), (8.1, 6.1), (4.5, 6.1), align=None)
    extrude(amount=BOSS_EXTRUDE18_DEPTH)

    # Chamfer1
    chamfer1_edges = [body_3.edges().sort_by_distance(p)[0] for p in [
        (6.3, 6.1, -35),
        (-6.3, 6.1, -35),
    ]]
    chamfer(chamfer1_edges, length=CHAMFER1_SIZE)

    # Fillet1
    fillet1_edges = [body_3.edges().sort_by_distance(p)[0] for p in [
        (4.5, -12.9, -45),
        (-4.5, -12.9, -45),
    ]]
    fillet(fillet1_edges, radius=FILLET1_R - 0.0001)  # a hair under: the kernel refuses the full size

    # Sketch19 → Cut-Extrude17 (cut)
    with BuildSketch(Plane(origin=(15.6, 0, 0), x_dir=(0, 0, -1), z_dir=(1, 0, 0))):
        with Locations(Location((50, -25, 0), (0, 0, 90))):
            Circle(SKETCH19_R)
    extrude(amount=-CUT_EXTRUDE17_DEPTH, mode=Mode.SUBTRACT)


solid = Compound([part.part, body_2.part, body_3.part])
